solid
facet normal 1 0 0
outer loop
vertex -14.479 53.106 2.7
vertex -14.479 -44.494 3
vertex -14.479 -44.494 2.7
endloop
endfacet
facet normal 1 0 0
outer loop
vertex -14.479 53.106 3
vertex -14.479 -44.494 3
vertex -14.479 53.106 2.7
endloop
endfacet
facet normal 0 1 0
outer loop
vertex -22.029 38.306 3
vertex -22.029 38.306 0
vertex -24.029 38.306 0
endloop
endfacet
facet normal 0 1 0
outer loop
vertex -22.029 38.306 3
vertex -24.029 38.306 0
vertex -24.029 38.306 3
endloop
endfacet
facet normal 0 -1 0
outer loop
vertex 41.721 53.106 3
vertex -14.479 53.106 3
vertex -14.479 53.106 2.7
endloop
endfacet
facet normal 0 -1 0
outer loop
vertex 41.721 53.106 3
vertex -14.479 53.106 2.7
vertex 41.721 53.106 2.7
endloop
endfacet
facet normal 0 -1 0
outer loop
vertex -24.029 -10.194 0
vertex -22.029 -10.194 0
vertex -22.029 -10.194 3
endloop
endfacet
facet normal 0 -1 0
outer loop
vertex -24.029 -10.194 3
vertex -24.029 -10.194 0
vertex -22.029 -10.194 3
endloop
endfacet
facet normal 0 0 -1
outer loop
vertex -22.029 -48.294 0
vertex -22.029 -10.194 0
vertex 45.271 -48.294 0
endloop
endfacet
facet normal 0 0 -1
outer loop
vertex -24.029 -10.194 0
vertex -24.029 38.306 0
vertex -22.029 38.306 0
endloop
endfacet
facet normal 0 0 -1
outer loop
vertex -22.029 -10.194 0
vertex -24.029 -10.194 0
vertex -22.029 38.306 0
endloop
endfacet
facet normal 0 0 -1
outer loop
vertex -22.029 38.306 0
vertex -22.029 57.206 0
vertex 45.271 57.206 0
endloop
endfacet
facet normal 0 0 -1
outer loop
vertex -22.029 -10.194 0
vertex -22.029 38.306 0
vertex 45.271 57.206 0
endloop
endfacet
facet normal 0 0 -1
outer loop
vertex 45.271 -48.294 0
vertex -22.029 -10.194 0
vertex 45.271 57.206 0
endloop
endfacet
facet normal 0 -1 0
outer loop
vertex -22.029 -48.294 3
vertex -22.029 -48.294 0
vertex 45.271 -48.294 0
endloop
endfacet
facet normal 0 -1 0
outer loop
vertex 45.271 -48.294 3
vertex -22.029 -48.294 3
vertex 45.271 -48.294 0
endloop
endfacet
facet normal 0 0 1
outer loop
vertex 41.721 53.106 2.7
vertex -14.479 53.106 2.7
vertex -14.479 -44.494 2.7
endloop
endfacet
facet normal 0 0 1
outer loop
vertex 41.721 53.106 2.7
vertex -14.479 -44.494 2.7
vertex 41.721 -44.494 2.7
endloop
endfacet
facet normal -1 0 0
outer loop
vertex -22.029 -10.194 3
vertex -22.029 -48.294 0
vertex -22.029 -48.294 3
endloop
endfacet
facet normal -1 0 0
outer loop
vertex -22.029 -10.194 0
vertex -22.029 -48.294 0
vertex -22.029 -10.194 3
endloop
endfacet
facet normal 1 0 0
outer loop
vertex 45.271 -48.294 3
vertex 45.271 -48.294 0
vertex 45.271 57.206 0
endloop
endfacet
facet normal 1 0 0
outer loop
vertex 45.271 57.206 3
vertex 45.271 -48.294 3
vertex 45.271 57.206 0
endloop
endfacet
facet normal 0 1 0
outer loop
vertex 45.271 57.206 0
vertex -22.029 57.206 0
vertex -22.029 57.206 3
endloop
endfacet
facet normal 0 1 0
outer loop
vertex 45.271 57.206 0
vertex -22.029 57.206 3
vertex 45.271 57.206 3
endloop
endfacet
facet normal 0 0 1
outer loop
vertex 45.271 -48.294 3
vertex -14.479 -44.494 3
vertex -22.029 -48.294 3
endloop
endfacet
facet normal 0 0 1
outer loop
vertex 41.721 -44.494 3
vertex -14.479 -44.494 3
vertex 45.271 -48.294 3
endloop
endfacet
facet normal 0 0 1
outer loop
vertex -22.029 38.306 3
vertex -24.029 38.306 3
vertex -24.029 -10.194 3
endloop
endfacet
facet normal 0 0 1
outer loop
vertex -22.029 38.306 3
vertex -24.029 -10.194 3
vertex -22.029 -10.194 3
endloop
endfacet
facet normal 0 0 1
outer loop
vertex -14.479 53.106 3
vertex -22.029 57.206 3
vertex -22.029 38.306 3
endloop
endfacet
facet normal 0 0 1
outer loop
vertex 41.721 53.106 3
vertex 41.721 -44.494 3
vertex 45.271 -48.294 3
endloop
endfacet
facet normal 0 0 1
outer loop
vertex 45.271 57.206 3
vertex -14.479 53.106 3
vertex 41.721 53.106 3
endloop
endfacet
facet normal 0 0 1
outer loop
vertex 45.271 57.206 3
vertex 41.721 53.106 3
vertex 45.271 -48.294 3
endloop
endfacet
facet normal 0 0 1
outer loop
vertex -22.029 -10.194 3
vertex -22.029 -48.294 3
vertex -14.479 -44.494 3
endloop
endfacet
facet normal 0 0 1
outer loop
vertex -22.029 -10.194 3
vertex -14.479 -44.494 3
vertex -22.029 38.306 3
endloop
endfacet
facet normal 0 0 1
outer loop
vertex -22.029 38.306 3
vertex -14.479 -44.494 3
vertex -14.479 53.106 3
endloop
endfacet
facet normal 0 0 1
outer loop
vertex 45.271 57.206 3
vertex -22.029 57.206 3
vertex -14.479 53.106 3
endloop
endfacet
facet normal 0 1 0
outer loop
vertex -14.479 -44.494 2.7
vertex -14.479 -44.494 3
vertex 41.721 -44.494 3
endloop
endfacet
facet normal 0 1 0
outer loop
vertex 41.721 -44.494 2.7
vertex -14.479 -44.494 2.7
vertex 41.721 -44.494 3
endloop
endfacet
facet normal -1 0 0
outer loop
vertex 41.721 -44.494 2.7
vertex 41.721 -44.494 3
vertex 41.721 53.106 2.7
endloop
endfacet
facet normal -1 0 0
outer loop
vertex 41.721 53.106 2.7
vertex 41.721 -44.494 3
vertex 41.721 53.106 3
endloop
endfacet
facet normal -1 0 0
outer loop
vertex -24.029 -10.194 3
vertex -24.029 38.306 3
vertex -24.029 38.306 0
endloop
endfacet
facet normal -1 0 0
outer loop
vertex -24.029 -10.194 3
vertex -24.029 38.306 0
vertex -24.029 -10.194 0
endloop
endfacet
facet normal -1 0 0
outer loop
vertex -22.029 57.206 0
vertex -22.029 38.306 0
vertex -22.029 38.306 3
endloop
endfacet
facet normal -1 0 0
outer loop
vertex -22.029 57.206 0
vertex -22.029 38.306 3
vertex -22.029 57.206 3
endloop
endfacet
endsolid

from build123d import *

# Parameters (mm, degrees)
F0_W     = 67.3
F0_H     = 105.5
F1_DEPTH = 3
F2_W     = 56.2
F2_H     = 97.6
F3_DEPTH = 0.3
F4_W     = 48.5
F4_H     = 3
F5_DEPTH = 2


with BuildPart() as f1:
    # F0 (on Top) → F1 (new body)
    with BuildSketch(Plane.XY):
        with Locations((11.620628, 4.456163)):
            Rectangle(F0_W, F0_H)
    extrude(amount=F1_DEPTH)

    # F2 (on face) → F3 (cut)
    with BuildSketch(Plane.XY.offset(3)):
        with Locations((13.620628, 4.306163)):
            Rectangle(F2_W, F2_H)
    extrude(amount=-F3_DEPTH, mode=Mode.SUBTRACT)

    # F4 (on face) → F5 (join)
    with BuildSketch(Plane(origin=(-22.029372, 0, 0), x_dir=(0, -1, 0), z_dir=(-1, 0, 0))):
        with Locations((-14.056163, 1.5)):
            Rectangle(F4_W, F4_H)
    extrude(amount=F5_DEPTH)


solid = f1.part
